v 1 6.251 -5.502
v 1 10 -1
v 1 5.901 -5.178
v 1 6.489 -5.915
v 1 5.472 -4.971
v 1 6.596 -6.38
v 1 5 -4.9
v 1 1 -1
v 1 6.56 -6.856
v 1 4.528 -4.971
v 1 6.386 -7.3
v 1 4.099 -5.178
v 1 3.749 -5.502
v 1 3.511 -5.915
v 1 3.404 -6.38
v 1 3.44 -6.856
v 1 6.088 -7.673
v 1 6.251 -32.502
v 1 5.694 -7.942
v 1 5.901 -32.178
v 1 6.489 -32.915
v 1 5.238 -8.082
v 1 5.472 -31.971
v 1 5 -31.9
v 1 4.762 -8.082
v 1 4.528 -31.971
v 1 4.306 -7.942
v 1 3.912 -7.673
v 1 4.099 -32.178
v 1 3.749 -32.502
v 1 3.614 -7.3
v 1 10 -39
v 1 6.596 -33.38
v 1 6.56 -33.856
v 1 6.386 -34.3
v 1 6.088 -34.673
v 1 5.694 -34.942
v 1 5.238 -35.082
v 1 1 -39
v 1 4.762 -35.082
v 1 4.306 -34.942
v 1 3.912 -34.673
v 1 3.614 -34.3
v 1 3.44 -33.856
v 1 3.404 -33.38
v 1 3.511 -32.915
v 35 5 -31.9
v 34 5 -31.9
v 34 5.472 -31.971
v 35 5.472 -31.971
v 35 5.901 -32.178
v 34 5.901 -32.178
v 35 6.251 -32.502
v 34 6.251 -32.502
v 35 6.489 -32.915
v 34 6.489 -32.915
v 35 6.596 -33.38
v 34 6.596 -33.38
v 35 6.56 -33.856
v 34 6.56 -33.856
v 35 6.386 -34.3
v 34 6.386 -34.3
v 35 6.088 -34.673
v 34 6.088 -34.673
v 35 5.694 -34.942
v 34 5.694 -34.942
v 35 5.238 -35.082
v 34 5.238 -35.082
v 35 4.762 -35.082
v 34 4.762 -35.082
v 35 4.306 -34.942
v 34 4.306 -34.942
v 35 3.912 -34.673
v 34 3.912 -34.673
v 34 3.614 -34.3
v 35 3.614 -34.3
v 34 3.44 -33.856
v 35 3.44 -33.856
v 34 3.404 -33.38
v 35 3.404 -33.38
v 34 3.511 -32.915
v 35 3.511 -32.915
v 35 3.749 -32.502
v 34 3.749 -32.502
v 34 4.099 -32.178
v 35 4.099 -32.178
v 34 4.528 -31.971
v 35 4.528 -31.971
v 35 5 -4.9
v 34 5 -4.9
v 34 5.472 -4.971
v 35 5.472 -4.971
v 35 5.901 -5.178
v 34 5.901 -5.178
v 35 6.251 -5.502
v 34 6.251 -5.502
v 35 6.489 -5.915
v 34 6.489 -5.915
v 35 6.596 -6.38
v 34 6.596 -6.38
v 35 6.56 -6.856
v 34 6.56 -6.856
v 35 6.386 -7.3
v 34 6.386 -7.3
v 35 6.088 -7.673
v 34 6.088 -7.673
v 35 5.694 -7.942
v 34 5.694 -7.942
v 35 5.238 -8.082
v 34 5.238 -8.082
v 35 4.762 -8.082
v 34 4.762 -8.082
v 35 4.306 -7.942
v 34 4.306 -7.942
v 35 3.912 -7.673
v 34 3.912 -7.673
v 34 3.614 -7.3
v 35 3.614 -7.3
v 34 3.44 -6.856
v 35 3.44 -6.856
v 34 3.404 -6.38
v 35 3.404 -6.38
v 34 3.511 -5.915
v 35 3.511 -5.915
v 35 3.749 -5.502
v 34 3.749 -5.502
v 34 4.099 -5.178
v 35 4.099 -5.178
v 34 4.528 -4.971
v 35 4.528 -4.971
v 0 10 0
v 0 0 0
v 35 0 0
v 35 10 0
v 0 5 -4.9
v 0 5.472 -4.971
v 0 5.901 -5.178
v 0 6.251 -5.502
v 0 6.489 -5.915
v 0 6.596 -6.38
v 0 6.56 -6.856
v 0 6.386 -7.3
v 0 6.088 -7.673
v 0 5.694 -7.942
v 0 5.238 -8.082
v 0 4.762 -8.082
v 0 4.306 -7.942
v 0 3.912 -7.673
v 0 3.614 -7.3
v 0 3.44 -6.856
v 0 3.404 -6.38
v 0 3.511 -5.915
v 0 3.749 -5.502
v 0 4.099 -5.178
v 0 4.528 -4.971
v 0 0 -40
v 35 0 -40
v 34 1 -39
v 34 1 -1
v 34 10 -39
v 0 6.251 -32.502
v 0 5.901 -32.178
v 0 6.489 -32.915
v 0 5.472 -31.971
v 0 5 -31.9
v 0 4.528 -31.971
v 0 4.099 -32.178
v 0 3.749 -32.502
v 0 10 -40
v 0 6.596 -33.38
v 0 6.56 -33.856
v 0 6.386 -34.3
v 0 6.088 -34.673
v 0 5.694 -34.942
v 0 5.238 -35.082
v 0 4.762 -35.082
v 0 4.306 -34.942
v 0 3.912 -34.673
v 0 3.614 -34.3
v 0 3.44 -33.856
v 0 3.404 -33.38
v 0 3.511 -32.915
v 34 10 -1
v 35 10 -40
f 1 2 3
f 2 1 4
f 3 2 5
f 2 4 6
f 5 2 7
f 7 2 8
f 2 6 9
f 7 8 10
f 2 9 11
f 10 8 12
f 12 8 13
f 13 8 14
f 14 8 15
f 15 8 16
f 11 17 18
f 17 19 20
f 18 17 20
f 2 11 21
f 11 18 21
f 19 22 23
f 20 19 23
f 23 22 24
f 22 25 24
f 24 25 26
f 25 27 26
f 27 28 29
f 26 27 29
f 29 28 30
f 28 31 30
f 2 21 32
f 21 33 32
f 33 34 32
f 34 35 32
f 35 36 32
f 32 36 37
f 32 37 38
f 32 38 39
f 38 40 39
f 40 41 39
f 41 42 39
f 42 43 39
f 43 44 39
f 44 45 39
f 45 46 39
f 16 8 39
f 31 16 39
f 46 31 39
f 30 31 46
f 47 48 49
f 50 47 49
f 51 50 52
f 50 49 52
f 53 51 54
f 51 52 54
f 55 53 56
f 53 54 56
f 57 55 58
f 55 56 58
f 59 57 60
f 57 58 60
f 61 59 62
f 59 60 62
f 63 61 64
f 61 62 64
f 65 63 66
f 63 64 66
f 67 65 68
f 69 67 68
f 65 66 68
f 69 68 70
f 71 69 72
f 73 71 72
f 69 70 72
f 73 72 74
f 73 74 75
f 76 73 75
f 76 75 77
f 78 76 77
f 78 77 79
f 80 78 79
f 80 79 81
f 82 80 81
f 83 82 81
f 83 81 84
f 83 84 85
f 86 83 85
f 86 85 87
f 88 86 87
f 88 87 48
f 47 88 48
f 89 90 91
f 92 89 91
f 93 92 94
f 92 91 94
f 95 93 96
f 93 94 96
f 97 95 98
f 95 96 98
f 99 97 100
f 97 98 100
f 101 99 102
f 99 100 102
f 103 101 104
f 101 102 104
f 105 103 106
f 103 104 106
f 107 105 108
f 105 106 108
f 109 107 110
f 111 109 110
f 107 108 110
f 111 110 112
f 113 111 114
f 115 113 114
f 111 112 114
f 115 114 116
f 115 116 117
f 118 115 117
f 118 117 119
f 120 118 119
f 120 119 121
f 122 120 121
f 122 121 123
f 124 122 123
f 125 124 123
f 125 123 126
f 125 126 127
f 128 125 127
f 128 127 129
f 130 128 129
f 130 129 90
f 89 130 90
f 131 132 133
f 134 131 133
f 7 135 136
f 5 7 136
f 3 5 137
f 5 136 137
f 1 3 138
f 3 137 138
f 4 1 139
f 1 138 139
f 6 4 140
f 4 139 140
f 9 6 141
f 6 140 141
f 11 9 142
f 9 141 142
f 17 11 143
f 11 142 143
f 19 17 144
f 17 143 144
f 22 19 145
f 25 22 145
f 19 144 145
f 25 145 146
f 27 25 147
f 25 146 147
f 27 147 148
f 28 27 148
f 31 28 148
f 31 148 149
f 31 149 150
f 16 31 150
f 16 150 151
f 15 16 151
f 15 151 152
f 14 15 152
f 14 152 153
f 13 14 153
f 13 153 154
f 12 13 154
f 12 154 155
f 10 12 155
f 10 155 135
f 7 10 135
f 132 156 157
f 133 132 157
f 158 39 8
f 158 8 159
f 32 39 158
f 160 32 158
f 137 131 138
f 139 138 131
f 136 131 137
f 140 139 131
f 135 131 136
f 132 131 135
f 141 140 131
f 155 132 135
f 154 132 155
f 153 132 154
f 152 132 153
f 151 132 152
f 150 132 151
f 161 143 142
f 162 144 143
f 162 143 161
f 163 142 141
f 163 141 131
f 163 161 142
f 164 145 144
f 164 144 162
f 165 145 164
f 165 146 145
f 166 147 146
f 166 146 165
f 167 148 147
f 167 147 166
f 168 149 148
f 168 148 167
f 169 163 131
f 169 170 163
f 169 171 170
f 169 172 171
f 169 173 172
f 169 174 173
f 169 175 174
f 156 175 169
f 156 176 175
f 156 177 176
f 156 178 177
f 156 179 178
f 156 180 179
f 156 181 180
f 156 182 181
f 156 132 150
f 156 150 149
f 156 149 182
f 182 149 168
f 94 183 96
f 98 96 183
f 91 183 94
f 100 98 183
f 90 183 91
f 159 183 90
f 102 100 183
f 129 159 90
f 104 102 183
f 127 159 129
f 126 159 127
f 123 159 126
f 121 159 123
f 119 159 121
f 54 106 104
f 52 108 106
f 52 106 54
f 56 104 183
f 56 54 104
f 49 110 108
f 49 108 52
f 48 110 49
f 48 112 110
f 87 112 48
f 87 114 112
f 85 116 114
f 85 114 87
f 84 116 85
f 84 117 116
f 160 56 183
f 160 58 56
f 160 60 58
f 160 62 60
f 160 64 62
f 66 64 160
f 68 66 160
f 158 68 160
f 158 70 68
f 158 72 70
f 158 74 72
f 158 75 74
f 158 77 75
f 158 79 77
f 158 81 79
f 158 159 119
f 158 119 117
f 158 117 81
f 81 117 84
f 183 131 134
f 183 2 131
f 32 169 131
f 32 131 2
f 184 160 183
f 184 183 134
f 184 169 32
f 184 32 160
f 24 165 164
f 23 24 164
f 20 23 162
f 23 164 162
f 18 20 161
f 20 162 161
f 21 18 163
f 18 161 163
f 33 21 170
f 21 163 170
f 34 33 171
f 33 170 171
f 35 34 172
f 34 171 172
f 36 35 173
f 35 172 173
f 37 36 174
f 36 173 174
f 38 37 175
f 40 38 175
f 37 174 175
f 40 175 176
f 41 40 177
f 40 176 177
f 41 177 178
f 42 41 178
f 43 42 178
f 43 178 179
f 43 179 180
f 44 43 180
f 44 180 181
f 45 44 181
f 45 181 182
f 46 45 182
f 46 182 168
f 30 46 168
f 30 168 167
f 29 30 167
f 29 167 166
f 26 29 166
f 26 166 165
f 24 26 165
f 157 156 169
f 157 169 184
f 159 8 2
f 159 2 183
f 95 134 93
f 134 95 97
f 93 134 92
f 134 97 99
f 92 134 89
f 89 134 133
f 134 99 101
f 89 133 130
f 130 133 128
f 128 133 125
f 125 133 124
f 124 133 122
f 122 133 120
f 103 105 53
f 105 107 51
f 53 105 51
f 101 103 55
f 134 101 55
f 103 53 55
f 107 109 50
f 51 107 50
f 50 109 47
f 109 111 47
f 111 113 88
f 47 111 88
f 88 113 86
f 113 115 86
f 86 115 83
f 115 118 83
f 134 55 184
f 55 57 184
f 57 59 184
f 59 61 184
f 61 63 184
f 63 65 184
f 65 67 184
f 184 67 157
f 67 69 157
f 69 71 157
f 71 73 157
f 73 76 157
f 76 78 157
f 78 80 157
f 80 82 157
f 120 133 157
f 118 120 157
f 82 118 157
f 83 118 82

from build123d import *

# Parameters (mm, degrees)
SKETCH_1_W          = 35
SKETCH_1_H          = 40
EXTRUDE_1_DEPTH     = 10
SHELL_1_T           = -1
SKETCH_2_R          = 1.6
CUT_EXTRUDE_1_DEPTH = 55.083269132


with BuildPart() as part:
    # 草图1 → 凸台-拉伸1 (new body)
    with BuildSketch(Plane(origin=(0, 0, 0), x_dir=(1, 0, 0), z_dir=(0, 1, 0))):
        with Locations((17.5, 20)):
            Rectangle(SKETCH_1_W, SKETCH_1_H)
    extrude(amount=EXTRUDE_1_DEPTH)

    # 抽壳1
    shell_1_openings = [part.faces().sort_by_distance(p)[0] for p in [
        (17.5, 10, -20),
    ]]
    offset(amount=SHELL_1_T, openings=shell_1_openings, kind=Kind.INTERSECTION)

    # 草图2 → 切除-拉伸1 (cut, through all)
    with BuildSketch(Plane.ZY):
        with Locations((-33.5, 5)):
            Circle(SKETCH_2_R)
        with Locations((-6.5, 5)):
            Circle(SKETCH_2_R)
    extrude(amount=-CUT_EXTRUDE_1_DEPTH, mode=Mode.SUBTRACT)


solid = part.part
